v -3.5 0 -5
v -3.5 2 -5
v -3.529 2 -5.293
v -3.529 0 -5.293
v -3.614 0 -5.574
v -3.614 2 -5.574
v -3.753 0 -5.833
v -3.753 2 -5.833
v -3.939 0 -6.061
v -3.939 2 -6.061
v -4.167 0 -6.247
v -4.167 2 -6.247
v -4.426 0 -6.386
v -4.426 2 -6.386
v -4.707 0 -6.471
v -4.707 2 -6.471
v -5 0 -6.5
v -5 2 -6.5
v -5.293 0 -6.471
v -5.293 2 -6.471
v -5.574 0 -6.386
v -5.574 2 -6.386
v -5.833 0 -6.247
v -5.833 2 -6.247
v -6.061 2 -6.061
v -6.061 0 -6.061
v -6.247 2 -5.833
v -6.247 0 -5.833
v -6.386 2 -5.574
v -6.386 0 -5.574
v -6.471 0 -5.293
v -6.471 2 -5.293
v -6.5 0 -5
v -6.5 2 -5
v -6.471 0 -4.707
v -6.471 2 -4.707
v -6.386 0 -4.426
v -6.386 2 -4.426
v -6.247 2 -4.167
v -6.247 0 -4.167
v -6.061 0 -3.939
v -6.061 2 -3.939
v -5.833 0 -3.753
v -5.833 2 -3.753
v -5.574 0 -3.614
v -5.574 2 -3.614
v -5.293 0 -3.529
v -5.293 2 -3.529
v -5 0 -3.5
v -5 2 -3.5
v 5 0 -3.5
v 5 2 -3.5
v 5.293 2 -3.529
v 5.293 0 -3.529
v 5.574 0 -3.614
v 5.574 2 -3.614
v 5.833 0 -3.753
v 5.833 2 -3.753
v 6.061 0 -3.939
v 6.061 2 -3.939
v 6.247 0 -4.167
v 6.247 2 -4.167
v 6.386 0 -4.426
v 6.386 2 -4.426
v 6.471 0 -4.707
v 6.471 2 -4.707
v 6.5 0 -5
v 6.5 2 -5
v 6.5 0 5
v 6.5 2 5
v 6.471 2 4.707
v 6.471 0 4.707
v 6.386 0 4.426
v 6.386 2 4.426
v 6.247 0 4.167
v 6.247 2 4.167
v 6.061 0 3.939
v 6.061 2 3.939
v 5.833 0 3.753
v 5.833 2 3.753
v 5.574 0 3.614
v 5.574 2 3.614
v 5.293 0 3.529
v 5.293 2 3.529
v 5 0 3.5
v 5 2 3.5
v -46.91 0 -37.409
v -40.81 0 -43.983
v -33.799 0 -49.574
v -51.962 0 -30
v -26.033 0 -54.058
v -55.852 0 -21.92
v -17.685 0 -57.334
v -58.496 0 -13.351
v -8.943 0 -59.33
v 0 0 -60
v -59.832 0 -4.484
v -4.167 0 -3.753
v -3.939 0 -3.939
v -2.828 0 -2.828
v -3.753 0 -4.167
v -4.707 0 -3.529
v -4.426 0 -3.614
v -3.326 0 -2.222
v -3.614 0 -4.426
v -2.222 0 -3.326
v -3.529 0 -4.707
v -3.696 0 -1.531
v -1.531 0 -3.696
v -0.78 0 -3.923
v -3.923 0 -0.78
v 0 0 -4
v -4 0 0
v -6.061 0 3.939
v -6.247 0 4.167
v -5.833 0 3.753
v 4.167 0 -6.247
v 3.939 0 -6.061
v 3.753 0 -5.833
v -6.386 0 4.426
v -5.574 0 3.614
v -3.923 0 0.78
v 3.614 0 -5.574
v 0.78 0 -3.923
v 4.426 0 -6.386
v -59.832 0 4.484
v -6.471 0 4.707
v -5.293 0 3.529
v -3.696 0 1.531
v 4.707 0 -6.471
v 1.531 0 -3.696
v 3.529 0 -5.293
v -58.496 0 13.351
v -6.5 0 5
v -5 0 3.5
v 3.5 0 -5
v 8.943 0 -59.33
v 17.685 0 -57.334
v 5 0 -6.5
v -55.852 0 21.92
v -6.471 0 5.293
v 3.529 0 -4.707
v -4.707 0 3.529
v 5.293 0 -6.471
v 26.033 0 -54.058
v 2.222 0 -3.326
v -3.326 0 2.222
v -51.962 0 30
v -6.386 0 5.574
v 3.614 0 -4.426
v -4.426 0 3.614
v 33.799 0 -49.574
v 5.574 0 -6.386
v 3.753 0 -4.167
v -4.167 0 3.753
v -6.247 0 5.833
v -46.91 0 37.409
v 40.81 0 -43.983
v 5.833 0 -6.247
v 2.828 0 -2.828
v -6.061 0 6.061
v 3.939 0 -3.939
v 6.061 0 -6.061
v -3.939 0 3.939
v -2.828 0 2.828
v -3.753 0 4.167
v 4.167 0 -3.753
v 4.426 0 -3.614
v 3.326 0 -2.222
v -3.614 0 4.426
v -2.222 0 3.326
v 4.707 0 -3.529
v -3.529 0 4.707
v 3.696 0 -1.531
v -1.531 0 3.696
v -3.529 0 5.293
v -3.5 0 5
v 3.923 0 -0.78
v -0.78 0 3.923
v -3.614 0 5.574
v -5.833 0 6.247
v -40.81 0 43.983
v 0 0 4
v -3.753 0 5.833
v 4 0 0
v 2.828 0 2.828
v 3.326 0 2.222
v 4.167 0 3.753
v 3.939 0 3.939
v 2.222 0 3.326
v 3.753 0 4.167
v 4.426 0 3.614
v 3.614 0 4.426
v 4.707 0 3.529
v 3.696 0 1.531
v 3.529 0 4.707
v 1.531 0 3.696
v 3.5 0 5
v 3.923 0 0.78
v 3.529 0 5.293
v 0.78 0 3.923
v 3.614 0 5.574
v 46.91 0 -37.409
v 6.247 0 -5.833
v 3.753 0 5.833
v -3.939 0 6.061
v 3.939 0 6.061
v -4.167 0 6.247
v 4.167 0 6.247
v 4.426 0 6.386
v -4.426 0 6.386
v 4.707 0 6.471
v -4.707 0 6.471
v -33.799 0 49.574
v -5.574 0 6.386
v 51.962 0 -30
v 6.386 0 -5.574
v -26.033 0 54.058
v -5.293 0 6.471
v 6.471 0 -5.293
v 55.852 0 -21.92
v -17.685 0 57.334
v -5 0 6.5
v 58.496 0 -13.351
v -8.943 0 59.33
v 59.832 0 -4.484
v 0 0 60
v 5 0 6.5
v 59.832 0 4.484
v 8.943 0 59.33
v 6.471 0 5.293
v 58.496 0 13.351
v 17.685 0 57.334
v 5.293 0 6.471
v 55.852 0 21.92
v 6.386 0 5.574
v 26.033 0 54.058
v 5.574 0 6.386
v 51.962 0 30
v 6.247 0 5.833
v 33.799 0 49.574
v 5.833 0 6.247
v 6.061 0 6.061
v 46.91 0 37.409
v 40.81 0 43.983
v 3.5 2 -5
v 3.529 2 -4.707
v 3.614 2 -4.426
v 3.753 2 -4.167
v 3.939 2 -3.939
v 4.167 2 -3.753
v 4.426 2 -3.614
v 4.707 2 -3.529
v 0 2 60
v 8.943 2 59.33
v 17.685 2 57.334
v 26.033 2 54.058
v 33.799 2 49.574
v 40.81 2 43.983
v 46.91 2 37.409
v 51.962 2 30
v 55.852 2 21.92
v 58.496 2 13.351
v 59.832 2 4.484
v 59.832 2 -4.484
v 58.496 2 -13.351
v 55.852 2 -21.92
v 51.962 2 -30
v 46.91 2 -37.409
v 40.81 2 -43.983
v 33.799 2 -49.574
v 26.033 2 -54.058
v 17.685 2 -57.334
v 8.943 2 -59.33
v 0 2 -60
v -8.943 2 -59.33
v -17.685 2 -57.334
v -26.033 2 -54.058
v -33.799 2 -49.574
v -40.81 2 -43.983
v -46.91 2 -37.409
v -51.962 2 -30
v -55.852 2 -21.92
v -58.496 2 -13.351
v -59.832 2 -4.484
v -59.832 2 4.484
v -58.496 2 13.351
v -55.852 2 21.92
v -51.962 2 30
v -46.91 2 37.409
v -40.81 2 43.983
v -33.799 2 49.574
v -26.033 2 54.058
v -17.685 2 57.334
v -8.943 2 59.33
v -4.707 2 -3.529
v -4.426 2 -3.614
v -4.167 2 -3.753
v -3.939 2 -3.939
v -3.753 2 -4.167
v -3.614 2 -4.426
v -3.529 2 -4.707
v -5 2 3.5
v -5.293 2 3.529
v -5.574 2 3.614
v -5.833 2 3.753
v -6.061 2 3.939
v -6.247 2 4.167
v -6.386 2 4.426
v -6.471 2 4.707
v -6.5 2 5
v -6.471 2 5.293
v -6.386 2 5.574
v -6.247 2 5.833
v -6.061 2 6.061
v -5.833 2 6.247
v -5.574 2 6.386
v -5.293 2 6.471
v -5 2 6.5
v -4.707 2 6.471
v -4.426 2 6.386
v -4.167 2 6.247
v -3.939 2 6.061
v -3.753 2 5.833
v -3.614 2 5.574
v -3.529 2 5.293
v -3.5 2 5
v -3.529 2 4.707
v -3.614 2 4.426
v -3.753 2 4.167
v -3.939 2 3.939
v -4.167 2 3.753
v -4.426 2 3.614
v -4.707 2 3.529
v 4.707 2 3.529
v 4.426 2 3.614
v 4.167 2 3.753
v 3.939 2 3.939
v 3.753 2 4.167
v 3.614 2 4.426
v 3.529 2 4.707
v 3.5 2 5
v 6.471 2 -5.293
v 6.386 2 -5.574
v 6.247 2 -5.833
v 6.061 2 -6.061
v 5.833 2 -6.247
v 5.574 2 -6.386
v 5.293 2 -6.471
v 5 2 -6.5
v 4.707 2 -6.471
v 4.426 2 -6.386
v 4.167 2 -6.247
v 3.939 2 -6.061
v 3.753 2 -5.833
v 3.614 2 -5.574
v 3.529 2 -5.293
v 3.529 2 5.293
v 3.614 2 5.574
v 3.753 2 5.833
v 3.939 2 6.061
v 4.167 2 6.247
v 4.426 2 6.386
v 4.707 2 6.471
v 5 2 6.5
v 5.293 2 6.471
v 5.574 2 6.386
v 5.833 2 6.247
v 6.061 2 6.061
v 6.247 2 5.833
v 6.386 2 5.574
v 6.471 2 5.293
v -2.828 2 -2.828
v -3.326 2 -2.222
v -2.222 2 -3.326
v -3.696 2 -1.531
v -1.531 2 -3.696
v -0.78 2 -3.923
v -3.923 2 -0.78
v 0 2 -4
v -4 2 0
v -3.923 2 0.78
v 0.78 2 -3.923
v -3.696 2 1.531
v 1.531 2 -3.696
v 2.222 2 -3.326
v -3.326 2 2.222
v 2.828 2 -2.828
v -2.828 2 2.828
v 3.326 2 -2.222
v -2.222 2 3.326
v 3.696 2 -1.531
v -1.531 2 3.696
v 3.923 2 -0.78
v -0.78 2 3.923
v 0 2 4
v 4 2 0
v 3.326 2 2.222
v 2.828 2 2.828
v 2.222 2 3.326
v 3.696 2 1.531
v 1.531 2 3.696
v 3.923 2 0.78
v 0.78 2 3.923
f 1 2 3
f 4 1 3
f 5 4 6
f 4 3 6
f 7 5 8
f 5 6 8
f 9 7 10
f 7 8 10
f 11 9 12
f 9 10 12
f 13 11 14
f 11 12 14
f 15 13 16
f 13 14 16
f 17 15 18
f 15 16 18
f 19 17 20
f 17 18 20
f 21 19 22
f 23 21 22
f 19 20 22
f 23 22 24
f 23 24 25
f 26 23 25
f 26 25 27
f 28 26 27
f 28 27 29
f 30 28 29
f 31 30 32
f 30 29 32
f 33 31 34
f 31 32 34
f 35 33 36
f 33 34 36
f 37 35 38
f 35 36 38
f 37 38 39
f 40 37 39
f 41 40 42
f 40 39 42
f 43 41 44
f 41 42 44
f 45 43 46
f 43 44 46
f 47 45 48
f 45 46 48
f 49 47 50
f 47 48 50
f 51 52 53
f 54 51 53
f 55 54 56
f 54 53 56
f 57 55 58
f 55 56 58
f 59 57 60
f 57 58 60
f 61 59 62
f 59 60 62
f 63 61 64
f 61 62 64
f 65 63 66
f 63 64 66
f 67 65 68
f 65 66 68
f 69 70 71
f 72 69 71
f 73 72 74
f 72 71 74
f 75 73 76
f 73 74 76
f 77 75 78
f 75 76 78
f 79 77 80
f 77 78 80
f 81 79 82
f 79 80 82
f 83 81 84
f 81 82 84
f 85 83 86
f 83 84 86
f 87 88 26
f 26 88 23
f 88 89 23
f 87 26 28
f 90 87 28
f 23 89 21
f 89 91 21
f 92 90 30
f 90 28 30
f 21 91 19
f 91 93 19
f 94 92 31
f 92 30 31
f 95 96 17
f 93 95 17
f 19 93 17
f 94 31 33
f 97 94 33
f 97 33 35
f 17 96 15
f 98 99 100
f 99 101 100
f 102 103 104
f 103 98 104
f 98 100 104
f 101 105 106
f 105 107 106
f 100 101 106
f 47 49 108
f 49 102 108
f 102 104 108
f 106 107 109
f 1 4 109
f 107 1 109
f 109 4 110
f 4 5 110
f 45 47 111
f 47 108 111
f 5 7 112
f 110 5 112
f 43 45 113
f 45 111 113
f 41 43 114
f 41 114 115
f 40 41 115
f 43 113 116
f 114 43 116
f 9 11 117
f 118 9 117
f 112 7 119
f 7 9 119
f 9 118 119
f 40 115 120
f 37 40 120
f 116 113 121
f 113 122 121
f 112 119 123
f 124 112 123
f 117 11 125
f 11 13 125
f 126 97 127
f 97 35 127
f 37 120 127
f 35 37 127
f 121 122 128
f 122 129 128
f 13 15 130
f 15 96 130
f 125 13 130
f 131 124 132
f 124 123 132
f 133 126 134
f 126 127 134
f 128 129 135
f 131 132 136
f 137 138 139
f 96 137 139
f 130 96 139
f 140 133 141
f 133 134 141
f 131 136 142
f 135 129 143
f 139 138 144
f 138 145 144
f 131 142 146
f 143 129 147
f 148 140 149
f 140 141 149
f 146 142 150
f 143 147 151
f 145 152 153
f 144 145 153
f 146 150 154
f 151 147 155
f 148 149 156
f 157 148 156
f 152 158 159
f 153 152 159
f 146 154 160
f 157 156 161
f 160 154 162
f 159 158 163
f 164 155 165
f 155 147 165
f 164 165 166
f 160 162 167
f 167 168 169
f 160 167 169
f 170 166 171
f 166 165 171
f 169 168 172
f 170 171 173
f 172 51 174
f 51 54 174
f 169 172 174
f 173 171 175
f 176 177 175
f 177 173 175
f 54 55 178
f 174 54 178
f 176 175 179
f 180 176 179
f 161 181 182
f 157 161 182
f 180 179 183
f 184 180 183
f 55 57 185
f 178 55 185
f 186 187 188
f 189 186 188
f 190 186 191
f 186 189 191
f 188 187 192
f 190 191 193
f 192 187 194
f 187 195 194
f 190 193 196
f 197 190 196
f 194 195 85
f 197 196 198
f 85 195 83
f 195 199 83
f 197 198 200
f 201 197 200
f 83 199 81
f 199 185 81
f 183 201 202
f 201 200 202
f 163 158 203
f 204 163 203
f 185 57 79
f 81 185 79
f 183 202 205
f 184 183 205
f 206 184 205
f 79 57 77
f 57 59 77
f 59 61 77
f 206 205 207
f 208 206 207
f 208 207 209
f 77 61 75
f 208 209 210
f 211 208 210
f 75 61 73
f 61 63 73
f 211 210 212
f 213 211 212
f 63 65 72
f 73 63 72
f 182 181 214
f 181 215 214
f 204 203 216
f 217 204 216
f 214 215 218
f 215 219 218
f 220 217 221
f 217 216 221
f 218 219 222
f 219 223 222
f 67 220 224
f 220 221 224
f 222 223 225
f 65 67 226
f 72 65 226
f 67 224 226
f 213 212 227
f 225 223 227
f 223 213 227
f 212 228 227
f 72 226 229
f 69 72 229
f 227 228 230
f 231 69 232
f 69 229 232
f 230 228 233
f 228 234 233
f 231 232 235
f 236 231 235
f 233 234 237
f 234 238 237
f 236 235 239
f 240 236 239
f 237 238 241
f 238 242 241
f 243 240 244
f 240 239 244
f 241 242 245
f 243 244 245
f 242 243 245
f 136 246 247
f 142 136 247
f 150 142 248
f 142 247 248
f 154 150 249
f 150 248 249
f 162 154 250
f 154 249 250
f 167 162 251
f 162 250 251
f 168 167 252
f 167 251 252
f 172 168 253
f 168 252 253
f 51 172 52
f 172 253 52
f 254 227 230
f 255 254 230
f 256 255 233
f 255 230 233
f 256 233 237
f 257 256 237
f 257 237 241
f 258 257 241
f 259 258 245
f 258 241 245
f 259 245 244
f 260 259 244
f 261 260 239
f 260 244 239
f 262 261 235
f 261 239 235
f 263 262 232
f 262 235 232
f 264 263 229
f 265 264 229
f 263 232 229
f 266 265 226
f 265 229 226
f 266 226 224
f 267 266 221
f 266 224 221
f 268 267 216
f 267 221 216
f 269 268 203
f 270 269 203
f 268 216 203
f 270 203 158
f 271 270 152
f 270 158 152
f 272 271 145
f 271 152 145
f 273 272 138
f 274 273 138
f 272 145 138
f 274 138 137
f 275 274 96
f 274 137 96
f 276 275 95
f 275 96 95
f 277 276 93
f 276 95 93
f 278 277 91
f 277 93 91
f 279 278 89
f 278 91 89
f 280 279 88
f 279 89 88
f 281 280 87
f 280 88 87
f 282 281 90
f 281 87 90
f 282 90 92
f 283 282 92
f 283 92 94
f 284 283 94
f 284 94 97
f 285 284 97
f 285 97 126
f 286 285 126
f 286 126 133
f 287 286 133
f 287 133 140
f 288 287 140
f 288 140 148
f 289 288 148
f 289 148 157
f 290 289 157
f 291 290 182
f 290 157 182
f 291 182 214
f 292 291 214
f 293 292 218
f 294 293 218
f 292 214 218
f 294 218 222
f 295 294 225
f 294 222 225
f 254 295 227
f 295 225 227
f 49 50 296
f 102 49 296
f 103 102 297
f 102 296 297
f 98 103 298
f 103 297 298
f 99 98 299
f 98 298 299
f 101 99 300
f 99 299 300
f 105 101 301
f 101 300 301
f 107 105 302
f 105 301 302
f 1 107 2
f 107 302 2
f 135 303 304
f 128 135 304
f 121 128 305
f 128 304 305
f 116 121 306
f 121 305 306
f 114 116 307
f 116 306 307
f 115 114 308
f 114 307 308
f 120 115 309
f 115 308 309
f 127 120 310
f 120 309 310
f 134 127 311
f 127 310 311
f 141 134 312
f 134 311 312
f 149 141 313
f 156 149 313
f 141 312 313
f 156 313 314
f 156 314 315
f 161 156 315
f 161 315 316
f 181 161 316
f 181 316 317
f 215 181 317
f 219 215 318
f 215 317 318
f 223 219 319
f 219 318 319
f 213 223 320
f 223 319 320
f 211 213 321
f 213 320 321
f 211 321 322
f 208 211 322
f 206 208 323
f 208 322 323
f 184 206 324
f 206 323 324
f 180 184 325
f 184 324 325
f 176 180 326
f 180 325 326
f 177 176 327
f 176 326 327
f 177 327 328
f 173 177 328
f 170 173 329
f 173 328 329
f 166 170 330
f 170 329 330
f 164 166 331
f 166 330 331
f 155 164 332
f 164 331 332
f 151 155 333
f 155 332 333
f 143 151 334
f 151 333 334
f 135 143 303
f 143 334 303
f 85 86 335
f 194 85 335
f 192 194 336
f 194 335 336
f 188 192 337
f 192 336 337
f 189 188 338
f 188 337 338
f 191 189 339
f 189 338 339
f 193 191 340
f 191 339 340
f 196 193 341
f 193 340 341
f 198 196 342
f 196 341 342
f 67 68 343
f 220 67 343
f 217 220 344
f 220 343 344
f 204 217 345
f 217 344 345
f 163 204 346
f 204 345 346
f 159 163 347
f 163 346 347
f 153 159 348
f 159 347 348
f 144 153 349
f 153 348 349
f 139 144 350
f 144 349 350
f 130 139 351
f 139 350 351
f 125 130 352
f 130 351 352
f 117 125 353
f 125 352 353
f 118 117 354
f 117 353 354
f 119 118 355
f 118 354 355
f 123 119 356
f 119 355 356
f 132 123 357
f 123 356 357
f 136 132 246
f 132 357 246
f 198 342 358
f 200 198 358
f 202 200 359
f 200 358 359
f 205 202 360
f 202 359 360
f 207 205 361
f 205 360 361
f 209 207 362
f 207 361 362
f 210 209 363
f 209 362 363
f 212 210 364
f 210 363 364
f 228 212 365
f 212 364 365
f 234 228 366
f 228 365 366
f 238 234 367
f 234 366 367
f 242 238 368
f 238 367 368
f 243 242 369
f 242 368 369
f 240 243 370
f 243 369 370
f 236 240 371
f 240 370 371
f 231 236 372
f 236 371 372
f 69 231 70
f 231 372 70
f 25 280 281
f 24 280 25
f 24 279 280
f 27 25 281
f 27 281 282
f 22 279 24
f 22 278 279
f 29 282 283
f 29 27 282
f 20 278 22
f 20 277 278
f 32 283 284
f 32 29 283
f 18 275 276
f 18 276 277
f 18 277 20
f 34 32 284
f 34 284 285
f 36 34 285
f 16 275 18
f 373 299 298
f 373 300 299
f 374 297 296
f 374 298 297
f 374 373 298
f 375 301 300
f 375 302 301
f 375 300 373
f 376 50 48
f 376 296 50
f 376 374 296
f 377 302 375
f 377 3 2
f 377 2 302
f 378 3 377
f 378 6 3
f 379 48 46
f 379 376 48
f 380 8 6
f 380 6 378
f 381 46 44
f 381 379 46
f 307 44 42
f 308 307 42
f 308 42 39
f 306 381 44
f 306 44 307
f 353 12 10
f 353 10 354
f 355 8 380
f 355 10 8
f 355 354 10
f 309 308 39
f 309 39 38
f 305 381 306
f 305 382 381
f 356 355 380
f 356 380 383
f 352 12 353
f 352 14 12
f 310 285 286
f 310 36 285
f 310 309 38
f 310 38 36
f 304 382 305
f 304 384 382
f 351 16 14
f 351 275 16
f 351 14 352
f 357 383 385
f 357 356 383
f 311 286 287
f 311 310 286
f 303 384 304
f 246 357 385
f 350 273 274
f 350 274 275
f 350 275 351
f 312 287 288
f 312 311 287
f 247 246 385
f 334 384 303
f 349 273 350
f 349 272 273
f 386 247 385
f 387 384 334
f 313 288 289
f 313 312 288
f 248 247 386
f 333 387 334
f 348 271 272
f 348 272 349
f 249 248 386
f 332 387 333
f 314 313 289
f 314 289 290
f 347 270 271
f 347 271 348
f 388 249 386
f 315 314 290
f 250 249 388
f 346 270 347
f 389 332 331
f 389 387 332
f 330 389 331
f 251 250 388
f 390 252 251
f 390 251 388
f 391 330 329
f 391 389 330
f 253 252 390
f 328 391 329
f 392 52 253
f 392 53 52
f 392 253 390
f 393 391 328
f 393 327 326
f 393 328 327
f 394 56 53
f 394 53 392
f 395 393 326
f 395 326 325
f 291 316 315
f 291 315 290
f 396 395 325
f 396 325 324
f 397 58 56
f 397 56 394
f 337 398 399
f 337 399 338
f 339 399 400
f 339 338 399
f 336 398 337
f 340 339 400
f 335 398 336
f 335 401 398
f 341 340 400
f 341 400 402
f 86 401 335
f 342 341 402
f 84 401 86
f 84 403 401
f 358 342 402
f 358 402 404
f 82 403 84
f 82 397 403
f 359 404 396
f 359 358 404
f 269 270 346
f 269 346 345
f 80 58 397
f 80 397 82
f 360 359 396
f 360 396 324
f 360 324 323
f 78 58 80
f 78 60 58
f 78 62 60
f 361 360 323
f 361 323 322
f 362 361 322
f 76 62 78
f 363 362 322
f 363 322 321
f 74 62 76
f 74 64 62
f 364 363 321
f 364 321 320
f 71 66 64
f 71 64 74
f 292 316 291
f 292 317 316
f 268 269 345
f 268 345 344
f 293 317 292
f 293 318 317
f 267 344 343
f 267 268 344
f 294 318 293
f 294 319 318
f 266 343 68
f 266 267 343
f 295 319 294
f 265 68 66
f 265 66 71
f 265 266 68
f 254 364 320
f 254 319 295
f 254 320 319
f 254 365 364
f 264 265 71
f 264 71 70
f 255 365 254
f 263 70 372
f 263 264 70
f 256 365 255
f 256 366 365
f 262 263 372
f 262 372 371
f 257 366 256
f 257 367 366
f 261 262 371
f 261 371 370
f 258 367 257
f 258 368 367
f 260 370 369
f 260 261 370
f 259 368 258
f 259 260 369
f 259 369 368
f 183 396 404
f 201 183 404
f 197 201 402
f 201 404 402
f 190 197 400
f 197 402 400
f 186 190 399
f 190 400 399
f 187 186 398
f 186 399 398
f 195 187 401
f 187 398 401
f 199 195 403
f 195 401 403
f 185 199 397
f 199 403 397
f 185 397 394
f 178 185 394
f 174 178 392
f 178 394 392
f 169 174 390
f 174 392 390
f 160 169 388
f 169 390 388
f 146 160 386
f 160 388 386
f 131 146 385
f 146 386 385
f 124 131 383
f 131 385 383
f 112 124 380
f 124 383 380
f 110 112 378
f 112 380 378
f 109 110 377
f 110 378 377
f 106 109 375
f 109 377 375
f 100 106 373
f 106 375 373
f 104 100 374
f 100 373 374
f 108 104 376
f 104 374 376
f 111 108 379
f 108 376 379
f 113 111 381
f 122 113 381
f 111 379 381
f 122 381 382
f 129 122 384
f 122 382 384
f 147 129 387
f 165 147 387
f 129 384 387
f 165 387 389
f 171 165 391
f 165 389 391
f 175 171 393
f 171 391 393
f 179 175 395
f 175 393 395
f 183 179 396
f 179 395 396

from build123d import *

# Parameters (mm, degrees)
SKETCH_1_R          = 60
EXTRUDE_1_DEPTH     = 2
SKETCH_2_R          = 4
CUT_EXTRUDE_1_DEPTH = 2


with BuildPart() as part:
    # 草图1 → 凸台-拉伸1 (new body)
    with BuildSketch(Plane(origin=(0, 0, 0), x_dir=(1, 0, 0), z_dir=(0, 1, 0))):
        with Locations(Location((0, 0, 0), (0, 0, 270))):
            Circle(SKETCH_1_R)
    extrude(amount=EXTRUDE_1_DEPTH)

    # 草图2 → 切除-拉伸1 (cut)
    with BuildSketch(Plane(origin=(0, 2, 0), x_dir=(1, 0, 0), z_dir=(0, 1, 0))):
        with BuildLine():
            ThreePointArc((-3.5, 5), (-6.060660172, 6.060660172), (-5, 3.5))
            Line((-5, 3.5), (-5, 5))
            Line((-5, 5), (-3.5, 5))
        make_face()
        with BuildLine():
            Line((-5, 5), (-5, 3.5))
            ThreePointArc((-5, 3.5), (-3.939339828, 3.939339828), (-3.5, 5))
            Line((-3.5, 5), (-5, 5))
        make_face()
        with BuildLine():
            ThreePointArc((3.5, 5), (3.939339828, 3.939339828), (5, 3.5))
            Line((5, 3.5), (5, 5))
            Line((5, 5), (3.5, 5))
        make_face()
        with BuildLine():
            Line((5, 5), (5, 3.5))
            ThreePointArc((5, 3.5), (6.060660172, 3.939339828), (6.5, 5))
            ThreePointArc((6.5, 5), (5, 6.5), (3.5, 5))
            Line((3.5, 5), (5, 5))
        make_face()
        with Locations(Location((0, 0, 0), (0, 0, 270))):
            Circle(SKETCH_2_R)
        with BuildLine():
            ThreePointArc((5, -3.5), (3.939339828, -3.939339828), (3.5, -5))
            Line((3.5, -5), (5, -5))
            Line((5, -5), (5, -3.5))
        make_face()
        with BuildLine():
            Line((5, -5), (3.5, -5))
            ThreePointArc((3.5, -5), (5, -6.5), (6.5, -5))
            ThreePointArc((6.5, -5), (6.060660172, -3.939339828), (5, -3.5))
            Line((5, -3.5), (5, -5))
        make_face()
        with BuildLine():
            ThreePointArc((-5, -3.5), (-6.060660172, -6.060660172), (-3.5, -5))
            Line((-3.5, -5), (-5, -5))
            Line((-5, -5), (-5, -3.5))
        make_face()
        with BuildLine():
            Line((-5, -5), (-3.5, -5))
            ThreePointArc((-3.5, -5), (-3.939339828, -3.939339828), (-5, -3.5))
            Line((-5, -3.5), (-5, -5))
        make_face()
    extrude(amount=-CUT_EXTRUDE_1_DEPTH, mode=Mode.SUBTRACT)


solid = part.part
